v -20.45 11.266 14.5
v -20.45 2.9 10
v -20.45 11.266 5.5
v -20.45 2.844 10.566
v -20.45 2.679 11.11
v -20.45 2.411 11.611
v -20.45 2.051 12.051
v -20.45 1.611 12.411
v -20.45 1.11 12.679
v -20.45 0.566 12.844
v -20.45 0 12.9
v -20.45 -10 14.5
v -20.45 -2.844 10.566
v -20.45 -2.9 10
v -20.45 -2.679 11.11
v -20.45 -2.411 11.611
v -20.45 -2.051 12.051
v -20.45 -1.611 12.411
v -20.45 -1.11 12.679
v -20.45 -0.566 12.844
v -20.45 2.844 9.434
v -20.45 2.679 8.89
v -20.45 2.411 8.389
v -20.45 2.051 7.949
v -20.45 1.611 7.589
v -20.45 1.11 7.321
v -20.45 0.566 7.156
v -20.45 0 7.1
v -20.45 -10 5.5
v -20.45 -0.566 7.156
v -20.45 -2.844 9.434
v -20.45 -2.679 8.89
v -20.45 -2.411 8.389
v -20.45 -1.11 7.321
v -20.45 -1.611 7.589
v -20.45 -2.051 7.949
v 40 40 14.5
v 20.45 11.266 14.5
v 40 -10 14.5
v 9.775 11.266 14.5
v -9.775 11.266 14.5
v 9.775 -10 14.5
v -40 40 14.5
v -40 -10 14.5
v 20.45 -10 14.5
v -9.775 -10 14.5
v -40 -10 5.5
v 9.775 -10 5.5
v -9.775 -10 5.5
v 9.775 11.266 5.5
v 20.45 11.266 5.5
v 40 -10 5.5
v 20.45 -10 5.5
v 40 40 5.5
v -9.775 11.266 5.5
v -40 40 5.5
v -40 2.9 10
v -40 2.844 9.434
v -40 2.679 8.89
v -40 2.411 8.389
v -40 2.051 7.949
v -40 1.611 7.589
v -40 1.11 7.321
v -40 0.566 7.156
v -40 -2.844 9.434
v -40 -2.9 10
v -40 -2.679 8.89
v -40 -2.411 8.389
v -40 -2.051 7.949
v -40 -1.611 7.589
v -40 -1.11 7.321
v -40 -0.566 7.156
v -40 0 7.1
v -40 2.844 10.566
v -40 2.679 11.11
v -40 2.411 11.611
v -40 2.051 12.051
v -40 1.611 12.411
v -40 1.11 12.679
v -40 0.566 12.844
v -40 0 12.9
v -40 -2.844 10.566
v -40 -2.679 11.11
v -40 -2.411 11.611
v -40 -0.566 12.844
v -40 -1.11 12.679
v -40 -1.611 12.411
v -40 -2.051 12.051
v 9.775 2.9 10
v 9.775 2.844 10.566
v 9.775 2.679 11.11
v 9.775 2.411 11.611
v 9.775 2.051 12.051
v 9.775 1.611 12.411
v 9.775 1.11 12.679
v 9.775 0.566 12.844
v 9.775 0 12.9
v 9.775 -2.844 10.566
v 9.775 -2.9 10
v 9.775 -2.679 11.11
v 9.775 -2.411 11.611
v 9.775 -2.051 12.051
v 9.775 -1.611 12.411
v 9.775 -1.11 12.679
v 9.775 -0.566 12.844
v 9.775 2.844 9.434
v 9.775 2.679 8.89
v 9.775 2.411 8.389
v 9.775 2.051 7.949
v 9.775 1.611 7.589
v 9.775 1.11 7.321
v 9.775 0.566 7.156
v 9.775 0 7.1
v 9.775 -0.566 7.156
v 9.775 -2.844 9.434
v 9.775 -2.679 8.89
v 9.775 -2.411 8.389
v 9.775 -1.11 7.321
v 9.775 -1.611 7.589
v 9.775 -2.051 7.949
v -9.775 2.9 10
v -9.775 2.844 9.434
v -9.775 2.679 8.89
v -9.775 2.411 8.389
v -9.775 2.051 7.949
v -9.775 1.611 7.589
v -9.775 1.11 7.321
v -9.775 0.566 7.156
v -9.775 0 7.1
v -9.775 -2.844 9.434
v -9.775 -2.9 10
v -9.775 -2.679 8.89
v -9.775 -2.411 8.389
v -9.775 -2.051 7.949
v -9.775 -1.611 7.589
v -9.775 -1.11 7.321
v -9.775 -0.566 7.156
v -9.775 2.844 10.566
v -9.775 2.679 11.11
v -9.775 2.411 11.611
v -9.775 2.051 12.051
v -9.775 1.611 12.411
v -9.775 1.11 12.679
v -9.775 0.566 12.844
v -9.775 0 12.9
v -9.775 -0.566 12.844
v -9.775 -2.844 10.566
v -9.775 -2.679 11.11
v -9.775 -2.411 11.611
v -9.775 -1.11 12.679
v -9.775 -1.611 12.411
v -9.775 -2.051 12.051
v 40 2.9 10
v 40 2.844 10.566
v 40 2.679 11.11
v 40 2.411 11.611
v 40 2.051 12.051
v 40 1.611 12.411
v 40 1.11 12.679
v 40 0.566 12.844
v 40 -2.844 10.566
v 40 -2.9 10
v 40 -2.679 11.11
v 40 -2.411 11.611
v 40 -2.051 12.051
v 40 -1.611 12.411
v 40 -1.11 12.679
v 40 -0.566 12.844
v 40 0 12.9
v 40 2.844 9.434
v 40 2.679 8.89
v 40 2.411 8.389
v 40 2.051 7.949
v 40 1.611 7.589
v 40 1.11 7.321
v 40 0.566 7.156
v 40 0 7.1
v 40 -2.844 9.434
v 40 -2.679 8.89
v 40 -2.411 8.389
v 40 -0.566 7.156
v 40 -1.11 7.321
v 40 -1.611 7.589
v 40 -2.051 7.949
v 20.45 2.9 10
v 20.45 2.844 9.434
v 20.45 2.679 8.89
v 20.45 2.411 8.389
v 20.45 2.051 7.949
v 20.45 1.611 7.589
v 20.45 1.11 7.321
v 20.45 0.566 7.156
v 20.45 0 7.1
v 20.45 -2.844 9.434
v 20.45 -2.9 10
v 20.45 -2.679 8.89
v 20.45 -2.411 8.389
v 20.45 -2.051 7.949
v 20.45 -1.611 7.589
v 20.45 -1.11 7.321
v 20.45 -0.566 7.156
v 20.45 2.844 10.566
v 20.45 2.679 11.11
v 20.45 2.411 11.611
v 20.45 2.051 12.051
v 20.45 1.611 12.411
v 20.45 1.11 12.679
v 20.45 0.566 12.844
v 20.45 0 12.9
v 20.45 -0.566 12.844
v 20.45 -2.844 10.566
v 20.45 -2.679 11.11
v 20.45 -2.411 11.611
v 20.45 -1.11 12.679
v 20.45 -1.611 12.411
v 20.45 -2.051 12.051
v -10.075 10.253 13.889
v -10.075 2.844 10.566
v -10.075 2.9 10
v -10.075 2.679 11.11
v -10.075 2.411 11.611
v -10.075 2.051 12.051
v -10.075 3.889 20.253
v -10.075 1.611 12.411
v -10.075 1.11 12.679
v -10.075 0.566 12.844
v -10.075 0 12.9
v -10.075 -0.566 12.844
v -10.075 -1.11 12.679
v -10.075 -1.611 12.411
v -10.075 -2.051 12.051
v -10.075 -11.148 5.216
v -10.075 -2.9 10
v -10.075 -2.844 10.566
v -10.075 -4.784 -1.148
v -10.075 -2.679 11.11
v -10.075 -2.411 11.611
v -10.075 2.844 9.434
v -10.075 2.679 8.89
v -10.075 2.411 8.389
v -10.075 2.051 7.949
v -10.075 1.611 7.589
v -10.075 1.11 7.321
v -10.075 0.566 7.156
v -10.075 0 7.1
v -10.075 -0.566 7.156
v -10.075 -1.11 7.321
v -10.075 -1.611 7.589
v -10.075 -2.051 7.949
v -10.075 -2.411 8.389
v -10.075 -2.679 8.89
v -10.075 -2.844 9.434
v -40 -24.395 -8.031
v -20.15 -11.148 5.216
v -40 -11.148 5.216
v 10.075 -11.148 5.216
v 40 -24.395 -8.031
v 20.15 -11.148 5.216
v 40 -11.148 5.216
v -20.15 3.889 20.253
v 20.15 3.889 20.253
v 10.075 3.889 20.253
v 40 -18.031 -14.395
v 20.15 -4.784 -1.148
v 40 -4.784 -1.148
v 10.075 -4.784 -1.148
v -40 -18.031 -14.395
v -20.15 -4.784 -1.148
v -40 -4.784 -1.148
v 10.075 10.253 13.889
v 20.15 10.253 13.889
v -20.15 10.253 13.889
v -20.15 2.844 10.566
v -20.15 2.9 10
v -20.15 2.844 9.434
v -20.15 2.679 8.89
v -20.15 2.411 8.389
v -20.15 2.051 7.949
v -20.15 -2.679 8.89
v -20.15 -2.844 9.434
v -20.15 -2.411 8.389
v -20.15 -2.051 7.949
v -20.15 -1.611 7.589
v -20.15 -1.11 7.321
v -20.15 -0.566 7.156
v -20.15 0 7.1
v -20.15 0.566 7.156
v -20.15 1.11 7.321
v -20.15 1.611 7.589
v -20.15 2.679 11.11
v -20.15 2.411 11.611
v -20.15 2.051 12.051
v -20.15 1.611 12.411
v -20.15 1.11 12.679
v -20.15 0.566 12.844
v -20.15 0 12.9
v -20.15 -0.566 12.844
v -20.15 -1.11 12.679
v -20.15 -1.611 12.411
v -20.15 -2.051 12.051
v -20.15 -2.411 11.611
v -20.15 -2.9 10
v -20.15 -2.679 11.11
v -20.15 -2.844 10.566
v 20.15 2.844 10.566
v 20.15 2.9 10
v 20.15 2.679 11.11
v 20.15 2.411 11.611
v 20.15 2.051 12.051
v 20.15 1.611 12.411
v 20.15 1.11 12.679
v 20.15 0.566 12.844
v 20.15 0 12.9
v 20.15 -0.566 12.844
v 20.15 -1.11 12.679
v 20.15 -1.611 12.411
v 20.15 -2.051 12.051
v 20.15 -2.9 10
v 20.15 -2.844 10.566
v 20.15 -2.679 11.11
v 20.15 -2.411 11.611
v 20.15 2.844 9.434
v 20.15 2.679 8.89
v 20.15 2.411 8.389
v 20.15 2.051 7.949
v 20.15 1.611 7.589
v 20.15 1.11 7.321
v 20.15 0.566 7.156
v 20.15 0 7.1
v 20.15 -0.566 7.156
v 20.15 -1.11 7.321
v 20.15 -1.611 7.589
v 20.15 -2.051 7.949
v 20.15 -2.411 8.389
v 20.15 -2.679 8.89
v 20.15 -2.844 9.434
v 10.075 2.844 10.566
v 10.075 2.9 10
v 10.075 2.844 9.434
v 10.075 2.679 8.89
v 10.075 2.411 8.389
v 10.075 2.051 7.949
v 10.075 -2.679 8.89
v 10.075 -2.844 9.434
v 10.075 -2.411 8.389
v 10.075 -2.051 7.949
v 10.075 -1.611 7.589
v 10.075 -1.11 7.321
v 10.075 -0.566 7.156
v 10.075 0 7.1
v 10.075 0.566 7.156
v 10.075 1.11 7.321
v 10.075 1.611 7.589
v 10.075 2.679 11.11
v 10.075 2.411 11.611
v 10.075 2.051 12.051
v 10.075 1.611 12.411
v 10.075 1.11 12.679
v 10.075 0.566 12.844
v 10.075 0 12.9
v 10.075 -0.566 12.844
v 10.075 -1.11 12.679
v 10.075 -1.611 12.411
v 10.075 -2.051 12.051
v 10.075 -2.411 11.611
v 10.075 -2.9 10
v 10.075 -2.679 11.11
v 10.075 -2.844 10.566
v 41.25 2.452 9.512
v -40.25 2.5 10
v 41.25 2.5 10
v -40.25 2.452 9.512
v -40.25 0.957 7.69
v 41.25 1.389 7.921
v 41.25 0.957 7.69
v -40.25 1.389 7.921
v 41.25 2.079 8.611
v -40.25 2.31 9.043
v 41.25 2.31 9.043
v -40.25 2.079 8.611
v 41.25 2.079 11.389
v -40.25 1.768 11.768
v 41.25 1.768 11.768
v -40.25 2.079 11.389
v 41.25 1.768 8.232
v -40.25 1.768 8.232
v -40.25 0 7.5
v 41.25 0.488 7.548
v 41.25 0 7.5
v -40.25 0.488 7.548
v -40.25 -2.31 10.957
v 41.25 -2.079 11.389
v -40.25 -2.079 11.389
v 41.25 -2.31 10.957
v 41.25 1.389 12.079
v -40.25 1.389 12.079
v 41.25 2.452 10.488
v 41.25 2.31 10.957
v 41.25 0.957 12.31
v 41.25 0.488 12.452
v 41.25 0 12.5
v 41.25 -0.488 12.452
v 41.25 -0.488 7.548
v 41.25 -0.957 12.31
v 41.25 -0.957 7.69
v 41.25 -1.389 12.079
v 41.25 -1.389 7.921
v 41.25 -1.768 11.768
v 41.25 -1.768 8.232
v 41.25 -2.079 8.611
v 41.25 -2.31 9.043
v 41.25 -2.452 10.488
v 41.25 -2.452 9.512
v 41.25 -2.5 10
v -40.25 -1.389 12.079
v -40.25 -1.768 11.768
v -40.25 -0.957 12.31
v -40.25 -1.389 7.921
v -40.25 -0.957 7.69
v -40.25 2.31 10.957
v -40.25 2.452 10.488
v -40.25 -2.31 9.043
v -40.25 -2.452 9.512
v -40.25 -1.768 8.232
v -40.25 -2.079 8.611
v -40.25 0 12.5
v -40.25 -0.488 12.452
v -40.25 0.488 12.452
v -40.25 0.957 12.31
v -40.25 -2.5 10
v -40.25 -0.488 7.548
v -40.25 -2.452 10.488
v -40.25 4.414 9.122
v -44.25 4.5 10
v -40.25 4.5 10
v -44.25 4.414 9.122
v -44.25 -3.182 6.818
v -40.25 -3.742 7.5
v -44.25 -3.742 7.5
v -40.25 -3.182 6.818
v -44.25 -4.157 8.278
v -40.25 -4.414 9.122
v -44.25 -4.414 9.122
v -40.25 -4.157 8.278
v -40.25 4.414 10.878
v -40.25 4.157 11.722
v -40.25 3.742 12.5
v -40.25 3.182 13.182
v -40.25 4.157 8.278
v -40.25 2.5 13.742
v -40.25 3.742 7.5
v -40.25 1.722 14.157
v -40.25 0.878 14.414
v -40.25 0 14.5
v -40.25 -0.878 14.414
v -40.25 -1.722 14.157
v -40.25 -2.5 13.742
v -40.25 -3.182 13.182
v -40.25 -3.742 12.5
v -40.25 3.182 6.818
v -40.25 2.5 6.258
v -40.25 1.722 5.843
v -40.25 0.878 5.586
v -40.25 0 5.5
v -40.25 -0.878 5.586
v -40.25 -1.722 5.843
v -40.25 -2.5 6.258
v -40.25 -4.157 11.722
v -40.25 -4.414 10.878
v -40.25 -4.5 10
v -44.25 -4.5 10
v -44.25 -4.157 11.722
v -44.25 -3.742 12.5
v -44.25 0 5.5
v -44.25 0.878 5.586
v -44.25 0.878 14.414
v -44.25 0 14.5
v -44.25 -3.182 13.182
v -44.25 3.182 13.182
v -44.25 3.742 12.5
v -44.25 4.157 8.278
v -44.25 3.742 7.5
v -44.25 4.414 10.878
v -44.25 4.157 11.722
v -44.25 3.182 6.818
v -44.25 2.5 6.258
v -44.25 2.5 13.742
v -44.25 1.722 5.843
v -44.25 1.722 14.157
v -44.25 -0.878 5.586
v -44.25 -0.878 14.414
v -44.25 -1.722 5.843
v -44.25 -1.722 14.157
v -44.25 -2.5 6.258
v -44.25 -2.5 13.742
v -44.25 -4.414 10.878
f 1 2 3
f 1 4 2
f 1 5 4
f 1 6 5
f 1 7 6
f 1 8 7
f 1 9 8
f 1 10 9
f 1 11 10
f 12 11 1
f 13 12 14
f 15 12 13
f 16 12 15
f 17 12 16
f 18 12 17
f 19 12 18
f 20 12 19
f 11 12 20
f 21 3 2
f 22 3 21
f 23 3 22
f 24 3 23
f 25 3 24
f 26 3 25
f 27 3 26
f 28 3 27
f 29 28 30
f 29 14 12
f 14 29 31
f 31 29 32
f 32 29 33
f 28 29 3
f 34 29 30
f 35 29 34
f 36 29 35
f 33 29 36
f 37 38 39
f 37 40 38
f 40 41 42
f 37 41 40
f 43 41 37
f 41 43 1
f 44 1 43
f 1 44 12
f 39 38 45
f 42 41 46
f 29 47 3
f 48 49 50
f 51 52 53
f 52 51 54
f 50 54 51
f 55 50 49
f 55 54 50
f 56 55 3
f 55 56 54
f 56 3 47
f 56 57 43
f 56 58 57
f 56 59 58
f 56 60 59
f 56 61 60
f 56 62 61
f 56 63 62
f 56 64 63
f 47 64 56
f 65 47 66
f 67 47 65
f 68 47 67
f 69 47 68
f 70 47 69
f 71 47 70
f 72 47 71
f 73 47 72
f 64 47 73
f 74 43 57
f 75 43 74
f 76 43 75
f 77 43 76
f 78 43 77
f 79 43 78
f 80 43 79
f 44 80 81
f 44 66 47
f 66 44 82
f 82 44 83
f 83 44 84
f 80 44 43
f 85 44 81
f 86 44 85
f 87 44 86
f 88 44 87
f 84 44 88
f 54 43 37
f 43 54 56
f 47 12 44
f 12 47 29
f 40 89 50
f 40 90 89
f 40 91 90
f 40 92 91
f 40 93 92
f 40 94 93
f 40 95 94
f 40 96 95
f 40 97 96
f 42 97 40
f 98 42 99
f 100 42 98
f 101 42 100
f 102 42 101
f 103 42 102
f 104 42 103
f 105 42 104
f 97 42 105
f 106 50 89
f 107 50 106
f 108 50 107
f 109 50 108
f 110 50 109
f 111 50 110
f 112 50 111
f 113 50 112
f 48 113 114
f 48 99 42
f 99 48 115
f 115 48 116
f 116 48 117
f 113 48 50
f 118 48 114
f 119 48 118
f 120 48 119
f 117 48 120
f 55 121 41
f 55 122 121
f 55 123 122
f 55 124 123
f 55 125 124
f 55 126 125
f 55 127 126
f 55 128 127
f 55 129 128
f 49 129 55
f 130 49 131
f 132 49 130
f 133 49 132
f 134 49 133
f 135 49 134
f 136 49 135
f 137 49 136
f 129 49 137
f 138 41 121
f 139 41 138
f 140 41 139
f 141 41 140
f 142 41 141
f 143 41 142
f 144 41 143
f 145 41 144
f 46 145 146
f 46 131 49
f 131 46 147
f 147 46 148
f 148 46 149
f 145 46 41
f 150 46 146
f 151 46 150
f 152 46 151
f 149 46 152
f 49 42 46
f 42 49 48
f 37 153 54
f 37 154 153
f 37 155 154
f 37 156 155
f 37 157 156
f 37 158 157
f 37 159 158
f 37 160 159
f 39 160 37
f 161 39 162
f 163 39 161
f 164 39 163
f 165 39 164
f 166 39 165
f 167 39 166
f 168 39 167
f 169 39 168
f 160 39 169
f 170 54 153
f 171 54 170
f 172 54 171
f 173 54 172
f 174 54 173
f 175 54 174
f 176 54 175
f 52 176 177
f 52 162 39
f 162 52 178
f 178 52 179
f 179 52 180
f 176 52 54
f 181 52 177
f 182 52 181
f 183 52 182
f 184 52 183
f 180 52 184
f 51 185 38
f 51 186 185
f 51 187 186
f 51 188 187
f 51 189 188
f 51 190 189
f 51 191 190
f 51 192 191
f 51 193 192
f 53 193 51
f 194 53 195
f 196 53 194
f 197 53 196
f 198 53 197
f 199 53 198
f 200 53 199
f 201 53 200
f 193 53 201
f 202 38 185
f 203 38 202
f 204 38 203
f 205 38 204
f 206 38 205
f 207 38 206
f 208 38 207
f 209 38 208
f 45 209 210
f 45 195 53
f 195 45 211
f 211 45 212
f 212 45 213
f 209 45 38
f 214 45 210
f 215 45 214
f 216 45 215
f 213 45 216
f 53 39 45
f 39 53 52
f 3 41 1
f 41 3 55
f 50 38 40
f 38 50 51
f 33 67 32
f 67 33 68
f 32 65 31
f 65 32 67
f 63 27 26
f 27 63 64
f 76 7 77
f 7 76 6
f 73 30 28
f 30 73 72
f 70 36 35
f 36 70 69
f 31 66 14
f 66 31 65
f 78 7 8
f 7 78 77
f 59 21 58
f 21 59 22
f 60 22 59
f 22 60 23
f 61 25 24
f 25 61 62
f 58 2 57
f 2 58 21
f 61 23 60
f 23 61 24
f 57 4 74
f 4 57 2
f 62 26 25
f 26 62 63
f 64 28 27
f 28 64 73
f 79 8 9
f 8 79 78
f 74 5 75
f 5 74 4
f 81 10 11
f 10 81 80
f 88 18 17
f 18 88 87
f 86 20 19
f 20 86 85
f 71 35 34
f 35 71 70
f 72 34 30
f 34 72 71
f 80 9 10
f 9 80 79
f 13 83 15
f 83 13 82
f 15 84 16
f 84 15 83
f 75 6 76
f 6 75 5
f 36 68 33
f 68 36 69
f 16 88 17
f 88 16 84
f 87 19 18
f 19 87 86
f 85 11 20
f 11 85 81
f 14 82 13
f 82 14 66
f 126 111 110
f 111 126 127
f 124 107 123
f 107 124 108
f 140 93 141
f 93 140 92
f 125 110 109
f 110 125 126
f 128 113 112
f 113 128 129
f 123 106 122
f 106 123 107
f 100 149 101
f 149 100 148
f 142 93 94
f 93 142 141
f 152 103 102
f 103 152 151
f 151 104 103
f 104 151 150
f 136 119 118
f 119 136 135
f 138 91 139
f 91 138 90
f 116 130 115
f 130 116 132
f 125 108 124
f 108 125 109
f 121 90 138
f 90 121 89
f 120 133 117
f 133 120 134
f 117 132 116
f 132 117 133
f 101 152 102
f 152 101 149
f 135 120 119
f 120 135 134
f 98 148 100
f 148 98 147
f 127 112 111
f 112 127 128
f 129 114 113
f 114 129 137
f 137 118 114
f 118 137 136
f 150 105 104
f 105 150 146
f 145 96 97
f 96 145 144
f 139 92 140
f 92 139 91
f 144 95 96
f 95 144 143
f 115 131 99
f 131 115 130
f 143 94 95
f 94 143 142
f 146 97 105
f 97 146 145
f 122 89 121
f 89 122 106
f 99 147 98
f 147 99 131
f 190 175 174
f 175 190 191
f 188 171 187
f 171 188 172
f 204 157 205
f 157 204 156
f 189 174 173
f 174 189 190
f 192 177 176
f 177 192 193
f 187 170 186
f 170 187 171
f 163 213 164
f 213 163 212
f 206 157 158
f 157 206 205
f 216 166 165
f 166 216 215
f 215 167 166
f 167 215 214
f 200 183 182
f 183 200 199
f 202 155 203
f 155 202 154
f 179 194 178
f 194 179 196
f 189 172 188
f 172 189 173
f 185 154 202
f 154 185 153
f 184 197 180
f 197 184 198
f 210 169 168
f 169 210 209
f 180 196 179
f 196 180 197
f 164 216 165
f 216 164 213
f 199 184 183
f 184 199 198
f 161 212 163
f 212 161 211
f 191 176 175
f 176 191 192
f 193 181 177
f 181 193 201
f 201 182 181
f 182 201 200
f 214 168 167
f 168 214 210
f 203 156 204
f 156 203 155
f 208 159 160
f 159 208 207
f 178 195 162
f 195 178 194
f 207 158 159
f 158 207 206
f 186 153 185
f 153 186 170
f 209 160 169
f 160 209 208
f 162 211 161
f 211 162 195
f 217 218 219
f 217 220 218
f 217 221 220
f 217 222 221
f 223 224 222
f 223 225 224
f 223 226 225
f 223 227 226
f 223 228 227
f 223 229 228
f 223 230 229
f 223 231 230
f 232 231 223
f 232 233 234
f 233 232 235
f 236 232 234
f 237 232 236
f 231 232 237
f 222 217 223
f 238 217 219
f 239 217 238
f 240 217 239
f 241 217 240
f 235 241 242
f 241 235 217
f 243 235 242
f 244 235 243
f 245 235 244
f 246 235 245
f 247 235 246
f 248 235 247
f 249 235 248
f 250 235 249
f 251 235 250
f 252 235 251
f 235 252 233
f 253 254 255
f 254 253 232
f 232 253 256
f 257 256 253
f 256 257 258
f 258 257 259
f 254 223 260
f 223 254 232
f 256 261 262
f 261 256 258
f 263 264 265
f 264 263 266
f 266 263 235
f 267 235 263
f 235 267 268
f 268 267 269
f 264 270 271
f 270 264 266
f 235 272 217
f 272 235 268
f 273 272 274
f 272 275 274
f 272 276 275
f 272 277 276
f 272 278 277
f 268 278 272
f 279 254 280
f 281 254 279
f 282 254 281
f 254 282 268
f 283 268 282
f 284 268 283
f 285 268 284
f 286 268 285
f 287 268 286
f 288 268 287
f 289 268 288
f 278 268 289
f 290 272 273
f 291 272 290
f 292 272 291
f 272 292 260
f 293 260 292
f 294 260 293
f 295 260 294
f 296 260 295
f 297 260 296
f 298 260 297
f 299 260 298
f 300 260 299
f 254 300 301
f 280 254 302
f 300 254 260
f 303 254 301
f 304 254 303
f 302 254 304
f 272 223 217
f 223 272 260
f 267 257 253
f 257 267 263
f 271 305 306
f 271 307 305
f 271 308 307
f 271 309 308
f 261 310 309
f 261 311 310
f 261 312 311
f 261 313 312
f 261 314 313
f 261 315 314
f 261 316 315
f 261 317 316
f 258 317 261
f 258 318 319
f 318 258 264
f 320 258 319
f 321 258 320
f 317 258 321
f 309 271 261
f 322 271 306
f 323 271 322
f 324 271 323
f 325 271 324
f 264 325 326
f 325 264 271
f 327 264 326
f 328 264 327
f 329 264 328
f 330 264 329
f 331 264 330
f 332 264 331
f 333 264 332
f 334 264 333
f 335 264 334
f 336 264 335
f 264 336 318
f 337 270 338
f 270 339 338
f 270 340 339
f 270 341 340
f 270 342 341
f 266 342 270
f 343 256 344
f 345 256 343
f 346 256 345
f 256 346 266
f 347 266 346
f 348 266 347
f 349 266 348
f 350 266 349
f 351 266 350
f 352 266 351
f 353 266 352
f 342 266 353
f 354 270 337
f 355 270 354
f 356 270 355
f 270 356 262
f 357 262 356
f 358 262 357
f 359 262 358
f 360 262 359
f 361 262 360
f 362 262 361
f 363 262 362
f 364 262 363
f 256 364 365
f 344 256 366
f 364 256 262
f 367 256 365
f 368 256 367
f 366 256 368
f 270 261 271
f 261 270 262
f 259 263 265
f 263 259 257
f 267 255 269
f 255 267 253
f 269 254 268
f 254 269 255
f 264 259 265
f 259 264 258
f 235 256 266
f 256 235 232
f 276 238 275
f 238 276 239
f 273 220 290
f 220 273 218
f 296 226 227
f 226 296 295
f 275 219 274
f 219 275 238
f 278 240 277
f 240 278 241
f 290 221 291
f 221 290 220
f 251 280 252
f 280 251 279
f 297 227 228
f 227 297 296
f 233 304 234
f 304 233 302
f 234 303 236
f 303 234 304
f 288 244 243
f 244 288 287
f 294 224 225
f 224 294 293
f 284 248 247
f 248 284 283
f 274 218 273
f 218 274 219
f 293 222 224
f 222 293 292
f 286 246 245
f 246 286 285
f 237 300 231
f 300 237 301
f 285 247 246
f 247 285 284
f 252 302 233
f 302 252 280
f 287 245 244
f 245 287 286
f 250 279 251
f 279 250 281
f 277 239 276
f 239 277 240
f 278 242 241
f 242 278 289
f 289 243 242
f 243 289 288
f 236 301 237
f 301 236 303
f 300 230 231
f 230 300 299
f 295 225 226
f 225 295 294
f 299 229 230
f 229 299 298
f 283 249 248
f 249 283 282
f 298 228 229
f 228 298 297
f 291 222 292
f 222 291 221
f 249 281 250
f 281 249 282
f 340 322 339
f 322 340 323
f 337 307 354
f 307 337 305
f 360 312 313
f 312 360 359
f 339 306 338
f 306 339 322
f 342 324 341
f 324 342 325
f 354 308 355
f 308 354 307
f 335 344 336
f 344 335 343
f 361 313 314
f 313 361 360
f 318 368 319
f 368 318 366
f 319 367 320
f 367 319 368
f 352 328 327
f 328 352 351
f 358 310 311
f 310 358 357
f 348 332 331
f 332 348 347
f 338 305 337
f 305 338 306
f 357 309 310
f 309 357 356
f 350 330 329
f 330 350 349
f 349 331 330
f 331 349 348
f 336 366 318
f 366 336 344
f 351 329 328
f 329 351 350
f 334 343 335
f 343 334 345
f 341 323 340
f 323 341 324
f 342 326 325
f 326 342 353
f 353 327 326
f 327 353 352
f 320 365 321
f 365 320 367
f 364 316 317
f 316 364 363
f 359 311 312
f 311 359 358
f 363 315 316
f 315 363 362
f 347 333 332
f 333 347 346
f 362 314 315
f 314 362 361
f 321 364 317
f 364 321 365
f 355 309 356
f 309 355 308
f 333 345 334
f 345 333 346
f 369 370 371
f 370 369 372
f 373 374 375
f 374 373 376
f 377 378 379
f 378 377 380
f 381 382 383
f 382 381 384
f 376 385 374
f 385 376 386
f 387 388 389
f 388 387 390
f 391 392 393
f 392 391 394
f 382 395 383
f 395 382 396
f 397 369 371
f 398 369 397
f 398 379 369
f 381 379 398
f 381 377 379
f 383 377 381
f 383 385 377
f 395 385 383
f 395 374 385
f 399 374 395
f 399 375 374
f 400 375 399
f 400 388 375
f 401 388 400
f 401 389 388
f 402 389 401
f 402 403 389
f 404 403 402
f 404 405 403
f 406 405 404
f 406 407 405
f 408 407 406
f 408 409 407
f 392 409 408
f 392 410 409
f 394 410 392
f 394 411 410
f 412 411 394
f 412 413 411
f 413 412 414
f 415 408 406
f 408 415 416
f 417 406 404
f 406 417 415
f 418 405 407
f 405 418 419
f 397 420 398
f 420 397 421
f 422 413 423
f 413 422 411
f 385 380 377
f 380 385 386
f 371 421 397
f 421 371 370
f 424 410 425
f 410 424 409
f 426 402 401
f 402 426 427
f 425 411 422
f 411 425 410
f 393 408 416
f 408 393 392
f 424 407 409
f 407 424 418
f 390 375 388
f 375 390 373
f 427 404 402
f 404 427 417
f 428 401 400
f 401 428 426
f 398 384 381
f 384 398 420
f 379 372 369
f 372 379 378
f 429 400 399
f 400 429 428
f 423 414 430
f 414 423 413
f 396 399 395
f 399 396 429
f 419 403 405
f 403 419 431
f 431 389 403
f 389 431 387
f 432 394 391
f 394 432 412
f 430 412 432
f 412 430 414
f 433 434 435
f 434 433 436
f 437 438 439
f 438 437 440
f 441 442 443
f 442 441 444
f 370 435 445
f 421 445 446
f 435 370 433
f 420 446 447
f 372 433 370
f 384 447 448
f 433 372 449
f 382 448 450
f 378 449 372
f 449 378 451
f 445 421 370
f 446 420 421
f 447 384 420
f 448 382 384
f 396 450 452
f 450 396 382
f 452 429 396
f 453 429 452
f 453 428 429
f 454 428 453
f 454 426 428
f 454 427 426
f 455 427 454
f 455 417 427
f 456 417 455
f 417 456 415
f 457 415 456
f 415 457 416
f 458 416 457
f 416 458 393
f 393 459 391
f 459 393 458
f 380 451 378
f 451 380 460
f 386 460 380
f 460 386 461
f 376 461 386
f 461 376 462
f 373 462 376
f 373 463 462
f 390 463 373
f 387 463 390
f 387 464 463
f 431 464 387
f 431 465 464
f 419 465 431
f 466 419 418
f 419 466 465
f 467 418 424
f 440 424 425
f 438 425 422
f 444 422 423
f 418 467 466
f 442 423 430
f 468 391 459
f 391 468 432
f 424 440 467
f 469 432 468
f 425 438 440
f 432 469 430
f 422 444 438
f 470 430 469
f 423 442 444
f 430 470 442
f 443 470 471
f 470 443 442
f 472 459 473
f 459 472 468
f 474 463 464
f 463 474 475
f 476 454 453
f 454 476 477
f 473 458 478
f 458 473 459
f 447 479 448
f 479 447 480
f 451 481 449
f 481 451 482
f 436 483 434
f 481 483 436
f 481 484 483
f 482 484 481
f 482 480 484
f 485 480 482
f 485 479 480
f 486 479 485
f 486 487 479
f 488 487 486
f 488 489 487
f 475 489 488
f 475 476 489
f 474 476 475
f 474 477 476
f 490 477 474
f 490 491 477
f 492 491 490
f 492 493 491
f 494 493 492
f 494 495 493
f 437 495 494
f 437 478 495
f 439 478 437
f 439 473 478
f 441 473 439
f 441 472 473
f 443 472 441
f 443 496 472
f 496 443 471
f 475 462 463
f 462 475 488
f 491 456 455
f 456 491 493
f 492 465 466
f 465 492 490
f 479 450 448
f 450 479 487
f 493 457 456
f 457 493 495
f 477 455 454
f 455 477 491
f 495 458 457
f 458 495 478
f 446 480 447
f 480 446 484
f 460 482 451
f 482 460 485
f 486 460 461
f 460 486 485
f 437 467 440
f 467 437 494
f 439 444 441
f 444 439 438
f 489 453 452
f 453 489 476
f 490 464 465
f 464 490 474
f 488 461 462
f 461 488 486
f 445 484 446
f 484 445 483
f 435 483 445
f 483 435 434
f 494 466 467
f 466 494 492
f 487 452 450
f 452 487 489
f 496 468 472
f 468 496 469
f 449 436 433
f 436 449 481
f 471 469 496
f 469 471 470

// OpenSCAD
$fn = 32;

// ------------------------------------------------------------------------
// Butt hinge: hinge 80 mm, leaf swung 45 deg
// Every part is its own module, assembly() places every instance.
// ------------------------------------------------------------------------

// --- part 1 ---
module hinge_base() {
  difference() {
    union() {
      translate([-40, -10, -4.5]) cube([19.55, 50, 9]);
      translate([-9.775, -10, -4.5]) cube([19.55, 50, 9]);
      translate([20.45, -10, -4.5]) cube([19.55, 50, 9]);
      translate([-40, 11.266, -4.5]) cube([80, 28.734, 9]);
    }
    translate([-30.225, 0, 0]) rotate([0, 90, 0]) cylinder(h = 21.55, d = 5.8, center = true);
    translate([0, 0, 0]) rotate([0, 90, 0]) cylinder(h = 21.55, d = 5.8, center = true);
    translate([30.225, 0, 0]) rotate([0, 90, 0]) cylinder(h = 21.55, d = 5.8, center = true);
  }
}

// --- part 2 ---
module hinge_mover() {
  difference() {
    union() {
      translate([-20.15, -30, -4.5]) cube([10.075, 40, 9]);
      translate([10.075, -30, -4.5]) cube([10.075, 40, 9]);
      translate([-40, -30, -4.5]) cube([80, 18.734, 9]);
    }
    translate([-15.113, 0, 0]) rotate([0, 90, 0]) cylinder(h = 12.075, d = 5.8, center = true);
    translate([15.113, 0, 0]) rotate([0, 90, 0]) cylinder(h = 12.075, d = 5.8, center = true);
  }
}

// --- part 3 ---
module hinge_pin() {
  rotate([0, 90, 0]) cylinder(h = 82.5, d = 5, center = true);
  translate([-44.25, 0, 0]) rotate([0, 90, 0]) cylinder(h = 4, d = 9);
}

// --- assembly ---
module assembly() {
  color([0.80, 0.24, 0.20]) translate([0, 0, 10]) rotate([0, 0, 0]) hinge_base();
  color([0.20, 0.45, 0.75]) translate([0, 0, 10]) rotate([45, 0, 0]) hinge_mover();
  color([0.25, 0.62, 0.32]) translate([0, 0, 10]) rotate([0, 0, 0]) hinge_pin();
}

assembly();
